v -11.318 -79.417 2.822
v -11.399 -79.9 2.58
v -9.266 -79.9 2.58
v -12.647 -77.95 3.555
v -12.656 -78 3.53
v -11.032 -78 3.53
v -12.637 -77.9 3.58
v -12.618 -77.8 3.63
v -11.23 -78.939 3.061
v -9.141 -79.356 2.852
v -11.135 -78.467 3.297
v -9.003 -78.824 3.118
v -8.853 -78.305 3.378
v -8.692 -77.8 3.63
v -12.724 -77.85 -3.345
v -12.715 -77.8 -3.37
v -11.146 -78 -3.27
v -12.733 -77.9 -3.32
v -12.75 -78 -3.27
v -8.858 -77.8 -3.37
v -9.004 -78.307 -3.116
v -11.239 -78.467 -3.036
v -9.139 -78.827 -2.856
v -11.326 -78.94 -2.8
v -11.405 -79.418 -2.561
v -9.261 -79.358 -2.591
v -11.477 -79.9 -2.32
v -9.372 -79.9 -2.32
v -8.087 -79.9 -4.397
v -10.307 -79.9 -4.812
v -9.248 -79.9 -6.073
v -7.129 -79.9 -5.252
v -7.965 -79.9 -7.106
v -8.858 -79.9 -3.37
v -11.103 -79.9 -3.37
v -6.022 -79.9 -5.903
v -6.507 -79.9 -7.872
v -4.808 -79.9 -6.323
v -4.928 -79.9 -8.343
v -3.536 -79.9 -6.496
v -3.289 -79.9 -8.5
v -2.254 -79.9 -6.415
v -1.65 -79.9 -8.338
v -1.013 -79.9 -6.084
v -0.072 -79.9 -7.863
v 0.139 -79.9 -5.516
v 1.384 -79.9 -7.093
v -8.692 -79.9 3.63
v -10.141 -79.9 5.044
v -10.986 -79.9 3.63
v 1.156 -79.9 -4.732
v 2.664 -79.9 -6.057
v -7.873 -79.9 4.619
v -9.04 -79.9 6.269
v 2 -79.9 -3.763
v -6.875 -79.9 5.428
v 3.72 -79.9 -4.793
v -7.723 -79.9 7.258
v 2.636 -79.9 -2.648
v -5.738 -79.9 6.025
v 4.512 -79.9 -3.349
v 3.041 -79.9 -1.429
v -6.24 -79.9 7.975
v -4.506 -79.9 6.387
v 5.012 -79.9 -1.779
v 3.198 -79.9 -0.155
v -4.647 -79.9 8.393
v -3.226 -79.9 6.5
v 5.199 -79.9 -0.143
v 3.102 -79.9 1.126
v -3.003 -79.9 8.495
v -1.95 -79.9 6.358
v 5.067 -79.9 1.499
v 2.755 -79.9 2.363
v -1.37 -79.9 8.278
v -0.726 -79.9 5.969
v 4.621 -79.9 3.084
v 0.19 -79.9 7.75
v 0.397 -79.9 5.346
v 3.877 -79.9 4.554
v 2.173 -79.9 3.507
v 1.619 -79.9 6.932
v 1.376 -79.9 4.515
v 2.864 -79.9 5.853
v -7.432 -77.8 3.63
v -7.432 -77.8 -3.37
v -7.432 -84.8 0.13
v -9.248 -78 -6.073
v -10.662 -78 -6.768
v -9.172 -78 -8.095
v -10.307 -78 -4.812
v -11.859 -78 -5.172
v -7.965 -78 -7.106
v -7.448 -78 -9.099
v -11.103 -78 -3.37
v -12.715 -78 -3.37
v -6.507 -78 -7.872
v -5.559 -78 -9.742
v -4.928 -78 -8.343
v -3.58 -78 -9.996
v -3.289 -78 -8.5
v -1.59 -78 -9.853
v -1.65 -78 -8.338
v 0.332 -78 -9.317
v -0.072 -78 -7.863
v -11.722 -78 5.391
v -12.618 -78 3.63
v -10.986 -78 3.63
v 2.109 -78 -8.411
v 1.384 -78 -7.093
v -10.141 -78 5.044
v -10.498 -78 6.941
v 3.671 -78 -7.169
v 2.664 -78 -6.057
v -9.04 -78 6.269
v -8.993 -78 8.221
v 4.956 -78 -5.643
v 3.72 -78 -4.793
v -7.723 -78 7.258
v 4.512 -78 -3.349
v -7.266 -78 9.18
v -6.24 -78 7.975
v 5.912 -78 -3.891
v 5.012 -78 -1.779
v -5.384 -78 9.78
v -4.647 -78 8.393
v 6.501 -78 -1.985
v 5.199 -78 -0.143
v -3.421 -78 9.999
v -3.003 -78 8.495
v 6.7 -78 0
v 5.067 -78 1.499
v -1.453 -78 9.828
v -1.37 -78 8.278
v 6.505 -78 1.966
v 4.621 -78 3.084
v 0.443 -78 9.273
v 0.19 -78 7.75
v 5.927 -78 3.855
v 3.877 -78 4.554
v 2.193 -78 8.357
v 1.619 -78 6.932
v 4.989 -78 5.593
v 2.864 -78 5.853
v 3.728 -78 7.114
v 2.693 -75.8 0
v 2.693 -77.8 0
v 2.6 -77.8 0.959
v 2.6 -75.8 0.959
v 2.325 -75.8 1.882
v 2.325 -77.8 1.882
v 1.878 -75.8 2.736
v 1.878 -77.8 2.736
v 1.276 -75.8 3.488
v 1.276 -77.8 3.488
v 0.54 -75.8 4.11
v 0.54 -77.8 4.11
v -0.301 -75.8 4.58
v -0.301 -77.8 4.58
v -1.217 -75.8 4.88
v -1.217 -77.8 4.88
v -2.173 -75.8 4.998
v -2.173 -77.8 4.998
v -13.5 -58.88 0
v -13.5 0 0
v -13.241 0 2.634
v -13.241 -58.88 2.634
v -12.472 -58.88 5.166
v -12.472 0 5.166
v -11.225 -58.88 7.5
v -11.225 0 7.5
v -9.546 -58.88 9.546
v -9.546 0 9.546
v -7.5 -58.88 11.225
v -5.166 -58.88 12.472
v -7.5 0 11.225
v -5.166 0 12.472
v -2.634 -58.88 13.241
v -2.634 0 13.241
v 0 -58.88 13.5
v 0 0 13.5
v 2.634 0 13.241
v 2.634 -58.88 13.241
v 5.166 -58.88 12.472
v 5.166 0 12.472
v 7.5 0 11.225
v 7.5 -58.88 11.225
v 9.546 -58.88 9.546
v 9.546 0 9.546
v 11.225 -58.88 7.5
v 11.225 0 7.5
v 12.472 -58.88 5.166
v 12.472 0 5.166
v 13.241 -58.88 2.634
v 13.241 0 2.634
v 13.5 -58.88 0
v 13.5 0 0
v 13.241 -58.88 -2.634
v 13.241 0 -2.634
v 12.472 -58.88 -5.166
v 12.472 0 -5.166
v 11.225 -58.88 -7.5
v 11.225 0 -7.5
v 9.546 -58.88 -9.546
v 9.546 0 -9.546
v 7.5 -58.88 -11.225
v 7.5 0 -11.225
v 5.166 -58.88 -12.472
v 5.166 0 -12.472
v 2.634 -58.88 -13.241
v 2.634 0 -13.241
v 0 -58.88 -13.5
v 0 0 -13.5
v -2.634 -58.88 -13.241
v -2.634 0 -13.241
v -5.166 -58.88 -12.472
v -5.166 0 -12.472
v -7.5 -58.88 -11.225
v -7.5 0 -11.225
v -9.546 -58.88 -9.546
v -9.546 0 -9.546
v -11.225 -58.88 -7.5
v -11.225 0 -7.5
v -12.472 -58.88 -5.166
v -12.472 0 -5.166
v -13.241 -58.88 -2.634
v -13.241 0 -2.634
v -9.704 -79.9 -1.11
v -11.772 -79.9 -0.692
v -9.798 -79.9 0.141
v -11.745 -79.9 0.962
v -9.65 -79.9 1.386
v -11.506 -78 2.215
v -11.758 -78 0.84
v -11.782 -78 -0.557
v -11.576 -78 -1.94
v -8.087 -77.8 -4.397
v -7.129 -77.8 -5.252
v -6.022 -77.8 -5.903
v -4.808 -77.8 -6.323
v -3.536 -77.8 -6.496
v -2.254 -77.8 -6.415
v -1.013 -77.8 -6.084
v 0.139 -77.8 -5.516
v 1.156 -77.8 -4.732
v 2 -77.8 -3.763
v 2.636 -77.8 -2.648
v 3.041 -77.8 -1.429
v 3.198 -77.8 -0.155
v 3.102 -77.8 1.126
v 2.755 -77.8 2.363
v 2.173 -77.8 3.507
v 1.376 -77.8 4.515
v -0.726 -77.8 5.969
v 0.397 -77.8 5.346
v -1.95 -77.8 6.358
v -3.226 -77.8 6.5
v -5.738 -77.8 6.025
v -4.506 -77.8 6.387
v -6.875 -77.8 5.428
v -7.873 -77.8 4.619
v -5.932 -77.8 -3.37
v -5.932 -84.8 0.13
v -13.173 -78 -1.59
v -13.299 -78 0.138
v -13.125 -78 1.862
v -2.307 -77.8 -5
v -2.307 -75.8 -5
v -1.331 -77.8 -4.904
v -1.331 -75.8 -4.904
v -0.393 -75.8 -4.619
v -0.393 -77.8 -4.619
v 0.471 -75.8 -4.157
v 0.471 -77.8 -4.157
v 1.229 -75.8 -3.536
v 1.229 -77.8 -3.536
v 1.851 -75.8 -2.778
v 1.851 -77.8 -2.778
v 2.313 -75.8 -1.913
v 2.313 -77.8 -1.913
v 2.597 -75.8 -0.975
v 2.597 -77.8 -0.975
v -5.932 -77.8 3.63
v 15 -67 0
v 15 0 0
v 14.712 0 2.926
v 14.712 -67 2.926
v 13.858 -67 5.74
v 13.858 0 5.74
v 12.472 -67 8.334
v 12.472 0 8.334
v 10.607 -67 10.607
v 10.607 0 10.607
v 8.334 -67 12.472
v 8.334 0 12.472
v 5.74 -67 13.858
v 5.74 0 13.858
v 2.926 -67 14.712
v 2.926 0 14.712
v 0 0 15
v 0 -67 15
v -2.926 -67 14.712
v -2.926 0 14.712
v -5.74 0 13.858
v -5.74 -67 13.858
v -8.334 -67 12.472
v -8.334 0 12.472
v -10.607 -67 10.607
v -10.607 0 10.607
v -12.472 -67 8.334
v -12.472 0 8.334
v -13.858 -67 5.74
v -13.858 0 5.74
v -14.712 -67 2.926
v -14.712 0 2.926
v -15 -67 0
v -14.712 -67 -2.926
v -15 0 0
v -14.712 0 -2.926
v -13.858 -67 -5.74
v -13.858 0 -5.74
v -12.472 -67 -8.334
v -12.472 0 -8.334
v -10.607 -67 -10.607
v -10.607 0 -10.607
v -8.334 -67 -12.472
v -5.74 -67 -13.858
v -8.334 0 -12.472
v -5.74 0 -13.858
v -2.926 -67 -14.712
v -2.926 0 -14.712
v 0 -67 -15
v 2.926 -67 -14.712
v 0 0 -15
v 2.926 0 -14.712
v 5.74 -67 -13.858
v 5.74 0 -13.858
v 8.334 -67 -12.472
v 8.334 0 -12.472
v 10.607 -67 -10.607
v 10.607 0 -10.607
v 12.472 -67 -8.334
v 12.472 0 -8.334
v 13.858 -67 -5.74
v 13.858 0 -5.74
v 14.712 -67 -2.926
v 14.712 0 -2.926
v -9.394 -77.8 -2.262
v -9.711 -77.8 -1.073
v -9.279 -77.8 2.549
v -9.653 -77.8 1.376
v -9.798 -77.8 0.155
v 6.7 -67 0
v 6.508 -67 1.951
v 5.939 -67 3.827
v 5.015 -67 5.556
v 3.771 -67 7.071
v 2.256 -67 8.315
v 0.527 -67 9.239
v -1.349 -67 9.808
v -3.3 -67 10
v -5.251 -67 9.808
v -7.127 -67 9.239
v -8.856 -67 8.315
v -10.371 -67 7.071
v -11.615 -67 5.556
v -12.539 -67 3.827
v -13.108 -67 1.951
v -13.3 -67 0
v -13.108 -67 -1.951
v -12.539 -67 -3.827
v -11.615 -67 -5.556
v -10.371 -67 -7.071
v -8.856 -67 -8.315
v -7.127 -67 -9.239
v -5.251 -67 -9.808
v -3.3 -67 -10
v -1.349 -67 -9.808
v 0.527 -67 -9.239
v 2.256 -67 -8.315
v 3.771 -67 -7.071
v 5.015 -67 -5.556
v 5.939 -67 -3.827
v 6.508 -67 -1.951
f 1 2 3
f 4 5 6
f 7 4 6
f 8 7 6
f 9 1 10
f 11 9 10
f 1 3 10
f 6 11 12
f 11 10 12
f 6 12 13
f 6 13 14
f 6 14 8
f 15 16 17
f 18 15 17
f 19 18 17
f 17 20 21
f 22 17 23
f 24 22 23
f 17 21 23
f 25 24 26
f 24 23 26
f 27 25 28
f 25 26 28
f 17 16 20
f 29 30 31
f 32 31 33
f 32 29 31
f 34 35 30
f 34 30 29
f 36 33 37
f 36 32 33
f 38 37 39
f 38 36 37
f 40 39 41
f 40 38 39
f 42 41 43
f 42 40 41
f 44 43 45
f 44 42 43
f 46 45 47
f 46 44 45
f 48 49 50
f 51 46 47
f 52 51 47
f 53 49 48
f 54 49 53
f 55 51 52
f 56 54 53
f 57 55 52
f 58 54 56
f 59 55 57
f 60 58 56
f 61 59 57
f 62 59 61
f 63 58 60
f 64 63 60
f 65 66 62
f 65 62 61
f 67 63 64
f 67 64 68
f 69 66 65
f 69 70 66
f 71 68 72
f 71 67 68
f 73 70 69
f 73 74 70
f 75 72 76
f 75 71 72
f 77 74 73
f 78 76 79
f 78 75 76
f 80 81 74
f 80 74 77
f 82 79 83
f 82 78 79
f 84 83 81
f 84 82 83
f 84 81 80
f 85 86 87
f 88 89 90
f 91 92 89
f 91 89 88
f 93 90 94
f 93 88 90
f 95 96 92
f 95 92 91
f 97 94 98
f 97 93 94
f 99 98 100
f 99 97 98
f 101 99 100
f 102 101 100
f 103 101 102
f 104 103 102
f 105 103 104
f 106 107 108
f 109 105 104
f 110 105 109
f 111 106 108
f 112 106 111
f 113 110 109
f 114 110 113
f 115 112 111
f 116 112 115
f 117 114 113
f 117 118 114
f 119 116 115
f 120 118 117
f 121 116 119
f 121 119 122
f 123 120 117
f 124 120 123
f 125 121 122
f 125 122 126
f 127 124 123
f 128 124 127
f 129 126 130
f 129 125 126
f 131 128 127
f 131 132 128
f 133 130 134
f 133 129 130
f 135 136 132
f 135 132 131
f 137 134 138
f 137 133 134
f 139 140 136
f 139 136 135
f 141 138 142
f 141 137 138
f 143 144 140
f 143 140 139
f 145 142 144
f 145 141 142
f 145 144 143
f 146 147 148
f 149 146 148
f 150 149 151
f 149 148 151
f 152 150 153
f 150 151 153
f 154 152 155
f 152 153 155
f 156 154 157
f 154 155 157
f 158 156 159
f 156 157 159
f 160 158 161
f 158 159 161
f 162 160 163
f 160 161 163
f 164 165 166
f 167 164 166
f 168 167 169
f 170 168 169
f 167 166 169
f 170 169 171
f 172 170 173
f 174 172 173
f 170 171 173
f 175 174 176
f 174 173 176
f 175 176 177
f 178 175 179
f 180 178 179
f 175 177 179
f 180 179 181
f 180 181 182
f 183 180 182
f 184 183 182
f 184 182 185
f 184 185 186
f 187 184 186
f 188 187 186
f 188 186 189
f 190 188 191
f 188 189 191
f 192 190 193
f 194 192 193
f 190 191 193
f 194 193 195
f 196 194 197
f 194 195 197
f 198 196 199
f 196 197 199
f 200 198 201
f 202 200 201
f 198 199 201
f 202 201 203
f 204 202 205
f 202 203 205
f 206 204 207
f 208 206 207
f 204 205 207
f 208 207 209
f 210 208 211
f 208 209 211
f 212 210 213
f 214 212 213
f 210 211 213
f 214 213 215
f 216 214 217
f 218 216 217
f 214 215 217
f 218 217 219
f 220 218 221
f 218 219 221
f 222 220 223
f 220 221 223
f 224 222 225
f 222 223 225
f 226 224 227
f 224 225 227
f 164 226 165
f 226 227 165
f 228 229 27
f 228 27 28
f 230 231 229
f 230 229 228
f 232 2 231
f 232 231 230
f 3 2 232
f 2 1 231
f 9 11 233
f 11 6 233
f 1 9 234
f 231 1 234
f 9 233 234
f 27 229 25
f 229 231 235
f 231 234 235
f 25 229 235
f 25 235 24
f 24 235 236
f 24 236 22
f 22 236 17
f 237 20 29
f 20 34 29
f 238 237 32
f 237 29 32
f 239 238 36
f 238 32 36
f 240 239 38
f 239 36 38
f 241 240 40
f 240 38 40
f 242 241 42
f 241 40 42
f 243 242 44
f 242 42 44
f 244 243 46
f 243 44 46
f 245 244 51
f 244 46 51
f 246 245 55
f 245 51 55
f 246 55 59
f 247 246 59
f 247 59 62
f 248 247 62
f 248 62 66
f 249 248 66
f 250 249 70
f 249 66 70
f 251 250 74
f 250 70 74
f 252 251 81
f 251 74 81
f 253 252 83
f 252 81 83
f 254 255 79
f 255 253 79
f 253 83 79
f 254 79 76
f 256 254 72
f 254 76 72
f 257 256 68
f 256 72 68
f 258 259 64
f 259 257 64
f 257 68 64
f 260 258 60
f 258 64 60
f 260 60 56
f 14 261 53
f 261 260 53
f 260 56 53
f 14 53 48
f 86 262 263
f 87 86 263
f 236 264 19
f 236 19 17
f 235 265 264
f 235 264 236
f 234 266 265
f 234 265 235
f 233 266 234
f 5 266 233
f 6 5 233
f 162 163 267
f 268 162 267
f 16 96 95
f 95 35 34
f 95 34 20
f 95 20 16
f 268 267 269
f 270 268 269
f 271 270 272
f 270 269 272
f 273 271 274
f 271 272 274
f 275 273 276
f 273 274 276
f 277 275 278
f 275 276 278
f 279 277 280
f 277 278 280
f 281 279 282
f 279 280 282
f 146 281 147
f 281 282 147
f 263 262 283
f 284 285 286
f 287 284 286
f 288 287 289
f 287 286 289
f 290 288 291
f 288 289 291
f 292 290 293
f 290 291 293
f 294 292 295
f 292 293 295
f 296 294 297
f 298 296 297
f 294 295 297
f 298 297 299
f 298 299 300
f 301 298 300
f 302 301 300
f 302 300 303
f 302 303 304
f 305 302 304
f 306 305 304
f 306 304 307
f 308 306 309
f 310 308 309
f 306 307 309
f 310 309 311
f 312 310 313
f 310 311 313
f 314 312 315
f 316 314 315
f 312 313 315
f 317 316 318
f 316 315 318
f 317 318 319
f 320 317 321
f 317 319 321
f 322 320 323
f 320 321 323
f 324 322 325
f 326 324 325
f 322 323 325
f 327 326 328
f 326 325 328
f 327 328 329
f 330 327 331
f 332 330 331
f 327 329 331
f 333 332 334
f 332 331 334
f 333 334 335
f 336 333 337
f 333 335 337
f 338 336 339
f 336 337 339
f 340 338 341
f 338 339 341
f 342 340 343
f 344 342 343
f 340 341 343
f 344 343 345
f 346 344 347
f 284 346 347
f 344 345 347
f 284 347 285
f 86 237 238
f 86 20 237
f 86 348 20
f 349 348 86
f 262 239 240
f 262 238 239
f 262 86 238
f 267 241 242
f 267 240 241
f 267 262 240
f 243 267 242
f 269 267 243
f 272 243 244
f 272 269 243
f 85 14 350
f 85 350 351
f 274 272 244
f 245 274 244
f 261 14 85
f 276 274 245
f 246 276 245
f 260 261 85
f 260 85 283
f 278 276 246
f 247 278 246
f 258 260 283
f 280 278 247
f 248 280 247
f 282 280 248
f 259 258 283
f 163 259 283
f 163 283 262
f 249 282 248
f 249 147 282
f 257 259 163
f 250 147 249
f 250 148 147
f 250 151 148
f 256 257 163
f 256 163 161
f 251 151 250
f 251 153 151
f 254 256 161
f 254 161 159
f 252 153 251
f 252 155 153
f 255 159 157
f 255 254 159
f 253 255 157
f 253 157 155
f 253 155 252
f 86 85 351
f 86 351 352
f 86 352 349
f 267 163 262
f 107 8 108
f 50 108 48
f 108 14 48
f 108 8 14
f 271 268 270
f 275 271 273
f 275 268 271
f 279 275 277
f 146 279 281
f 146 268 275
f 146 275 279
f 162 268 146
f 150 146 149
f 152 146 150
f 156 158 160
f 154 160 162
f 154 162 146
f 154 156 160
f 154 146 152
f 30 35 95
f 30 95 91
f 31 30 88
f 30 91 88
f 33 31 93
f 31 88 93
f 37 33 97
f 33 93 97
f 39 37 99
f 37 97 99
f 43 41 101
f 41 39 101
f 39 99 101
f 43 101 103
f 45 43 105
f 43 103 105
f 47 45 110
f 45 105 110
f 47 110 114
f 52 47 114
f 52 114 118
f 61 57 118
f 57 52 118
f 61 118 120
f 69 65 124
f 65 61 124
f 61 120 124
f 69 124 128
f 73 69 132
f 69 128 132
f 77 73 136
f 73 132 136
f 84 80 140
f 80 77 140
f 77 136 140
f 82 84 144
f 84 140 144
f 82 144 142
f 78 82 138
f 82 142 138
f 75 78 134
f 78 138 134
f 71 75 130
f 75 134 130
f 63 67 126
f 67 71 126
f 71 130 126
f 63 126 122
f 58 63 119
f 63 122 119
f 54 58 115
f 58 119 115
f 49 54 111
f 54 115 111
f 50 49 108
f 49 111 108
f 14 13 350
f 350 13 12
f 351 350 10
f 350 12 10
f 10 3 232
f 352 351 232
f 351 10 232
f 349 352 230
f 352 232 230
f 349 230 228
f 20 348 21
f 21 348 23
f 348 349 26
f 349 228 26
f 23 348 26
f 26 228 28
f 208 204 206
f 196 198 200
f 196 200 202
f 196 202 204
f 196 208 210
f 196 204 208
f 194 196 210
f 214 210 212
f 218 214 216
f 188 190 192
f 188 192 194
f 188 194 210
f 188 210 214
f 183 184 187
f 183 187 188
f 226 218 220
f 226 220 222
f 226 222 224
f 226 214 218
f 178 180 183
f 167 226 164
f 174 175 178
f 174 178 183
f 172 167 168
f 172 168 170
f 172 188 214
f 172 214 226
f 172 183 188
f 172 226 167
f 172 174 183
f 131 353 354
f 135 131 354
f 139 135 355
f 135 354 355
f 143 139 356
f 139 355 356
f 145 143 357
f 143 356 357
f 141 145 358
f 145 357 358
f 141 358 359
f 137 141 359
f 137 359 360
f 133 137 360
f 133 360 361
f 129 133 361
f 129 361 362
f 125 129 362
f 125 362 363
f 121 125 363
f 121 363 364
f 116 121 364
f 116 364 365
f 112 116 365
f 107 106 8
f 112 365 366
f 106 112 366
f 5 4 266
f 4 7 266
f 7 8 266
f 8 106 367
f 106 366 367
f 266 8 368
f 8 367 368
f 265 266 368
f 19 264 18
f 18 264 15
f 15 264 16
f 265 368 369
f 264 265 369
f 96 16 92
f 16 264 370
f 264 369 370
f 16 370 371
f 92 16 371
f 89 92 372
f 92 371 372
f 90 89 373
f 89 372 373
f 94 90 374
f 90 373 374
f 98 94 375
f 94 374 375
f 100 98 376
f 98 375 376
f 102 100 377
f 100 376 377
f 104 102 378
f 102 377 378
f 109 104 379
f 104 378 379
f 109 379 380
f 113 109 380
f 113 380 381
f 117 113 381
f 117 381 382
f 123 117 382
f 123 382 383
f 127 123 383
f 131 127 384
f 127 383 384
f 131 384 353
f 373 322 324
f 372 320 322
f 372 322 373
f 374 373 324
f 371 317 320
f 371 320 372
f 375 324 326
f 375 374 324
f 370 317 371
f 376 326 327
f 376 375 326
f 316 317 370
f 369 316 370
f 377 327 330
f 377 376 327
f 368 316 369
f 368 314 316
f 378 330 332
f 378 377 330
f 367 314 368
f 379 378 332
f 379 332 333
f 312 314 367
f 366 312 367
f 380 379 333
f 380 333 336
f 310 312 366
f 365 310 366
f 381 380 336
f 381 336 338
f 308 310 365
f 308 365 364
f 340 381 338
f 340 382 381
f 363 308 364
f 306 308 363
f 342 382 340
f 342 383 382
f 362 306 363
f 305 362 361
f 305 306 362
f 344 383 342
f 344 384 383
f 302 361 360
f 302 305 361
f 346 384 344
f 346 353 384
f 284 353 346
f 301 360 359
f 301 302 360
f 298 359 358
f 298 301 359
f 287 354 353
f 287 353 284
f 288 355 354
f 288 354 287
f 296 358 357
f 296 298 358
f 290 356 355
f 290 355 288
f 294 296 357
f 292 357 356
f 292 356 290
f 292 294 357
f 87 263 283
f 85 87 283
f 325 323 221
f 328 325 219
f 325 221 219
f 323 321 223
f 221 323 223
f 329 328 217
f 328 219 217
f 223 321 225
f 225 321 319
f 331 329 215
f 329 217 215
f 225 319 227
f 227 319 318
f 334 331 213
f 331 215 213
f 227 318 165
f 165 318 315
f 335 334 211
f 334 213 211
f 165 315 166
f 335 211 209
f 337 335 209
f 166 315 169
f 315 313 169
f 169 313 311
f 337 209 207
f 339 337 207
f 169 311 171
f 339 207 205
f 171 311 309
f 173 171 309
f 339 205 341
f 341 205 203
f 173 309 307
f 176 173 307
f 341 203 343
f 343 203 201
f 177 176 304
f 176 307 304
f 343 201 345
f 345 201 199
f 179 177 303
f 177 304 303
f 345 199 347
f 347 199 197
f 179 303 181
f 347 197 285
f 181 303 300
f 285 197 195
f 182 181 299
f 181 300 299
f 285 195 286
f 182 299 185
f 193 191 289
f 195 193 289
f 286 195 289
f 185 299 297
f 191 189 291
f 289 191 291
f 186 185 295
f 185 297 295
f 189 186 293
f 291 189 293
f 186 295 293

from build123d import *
from build123d import SkipClean  # not in build123d's __all__

# Parameters (mm, degrees)
F0_R      = 15
F1_DEPTH  = 67
F2_R      = 10
F3_DEPTH  = 11
F4_R      = 8.5
F5_DEPTH  = 1.9
F6_R      = 6.5
F7_DEPTH  = 2.1
F9_DEPTH  = 2
F10_W     = 1.5
F10_H     = 7
F11_DEPTH = 7
F13_DEPTH = 9.0692195411
F15_DEPTH = 25
F16_R     = 13.5
F17_DEPTH = 58.88


with BuildPart() as f1:
    # F0 (on Front) → F1 (new body)
    with BuildSketch(Plane.XZ):
        Circle(F0_R)
    extrude(amount=F1_DEPTH)

    # F2 (on face) → F3 (join)
    with BuildSketch(Plane.XZ.offset(67)):
        with Locations((-3.3, 0)):
            Circle(F2_R)
    extrude(amount=F3_DEPTH)

    # F4 (on face) → F5 (join)
    with BuildSketch(Plane.XZ.offset(78)):
        with Locations((-3.3, 0)):
            Circle(F4_R)
    extrude(amount=F5_DEPTH)

    # F6 (on face) → F7 (cut)
    with BuildSketch(Plane.XZ.offset(79.9)):
        with Locations((-3.3, 0)):
            Circle(F6_R)
    extrude(amount=-F7_DEPTH, mode=Mode.SUBTRACT)

    # F8 (on face) → F9 (cut)
    with BuildSketch(Plane.XZ.offset(77.8)):
        with BuildLine():
            ThreePointArc((-2.3067915896, -5), (1.2287423164, -3.5355339059), (2.6932084104, 0))
            ThreePointArc((2.6932084104, 0), (1.2757387706, 3.4879042731), (-2.1729820769, 4.9982091807))
            Line((-2.1729820769, 4.9982091807), (-2.3067915896, -5))
        make_face()
    extrude(amount=-F9_DEPTH, mode=Mode.SUBTRACT)

    # F10 (on face) → F11 (join)
    with BuildSketch(Plane.XZ.offset(77.8)):
        with Locations((-6.6817804589, 0.1302052614)):
            Rectangle(F10_W, F10_H)
    extrude(amount=F11_DEPTH)

    # F12 (on face) → F13 (cut, through all)
    with BuildSketch(Plane.YZ.offset(-5.9317804589)):
        Polygon((-77.8, -3.3697947386), (-84.8, 0.1302052614), (-84.8, -3.3697947386), align=None)
    with SkipClean():  # cleaning this boolean's faces spoils the solid; the shape is the same uncleaned
        extrude(amount=-F13_DEPTH, mode=Mode.SUBTRACT)

    # F14 (on face) → F15 (cut)
    with BuildSketch(Plane.YZ.offset(-5.9317804589)):
        Polygon((-84.8, 3.6302052614), (-84.8, 0.1302052614), (-77.8, 3.6302052614), align=None)
    extrude(amount=-F15_DEPTH, mode=Mode.SUBTRACT)

    # F16 (on face) → F17 (cut)
    with BuildSketch(Plane(origin=(0, 0, 0), x_dir=(-1, 0, 0), z_dir=(0, 1, 0))):
        Circle(F16_R)
    extrude(amount=-F17_DEPTH, mode=Mode.SUBTRACT)


solid = f1.part
